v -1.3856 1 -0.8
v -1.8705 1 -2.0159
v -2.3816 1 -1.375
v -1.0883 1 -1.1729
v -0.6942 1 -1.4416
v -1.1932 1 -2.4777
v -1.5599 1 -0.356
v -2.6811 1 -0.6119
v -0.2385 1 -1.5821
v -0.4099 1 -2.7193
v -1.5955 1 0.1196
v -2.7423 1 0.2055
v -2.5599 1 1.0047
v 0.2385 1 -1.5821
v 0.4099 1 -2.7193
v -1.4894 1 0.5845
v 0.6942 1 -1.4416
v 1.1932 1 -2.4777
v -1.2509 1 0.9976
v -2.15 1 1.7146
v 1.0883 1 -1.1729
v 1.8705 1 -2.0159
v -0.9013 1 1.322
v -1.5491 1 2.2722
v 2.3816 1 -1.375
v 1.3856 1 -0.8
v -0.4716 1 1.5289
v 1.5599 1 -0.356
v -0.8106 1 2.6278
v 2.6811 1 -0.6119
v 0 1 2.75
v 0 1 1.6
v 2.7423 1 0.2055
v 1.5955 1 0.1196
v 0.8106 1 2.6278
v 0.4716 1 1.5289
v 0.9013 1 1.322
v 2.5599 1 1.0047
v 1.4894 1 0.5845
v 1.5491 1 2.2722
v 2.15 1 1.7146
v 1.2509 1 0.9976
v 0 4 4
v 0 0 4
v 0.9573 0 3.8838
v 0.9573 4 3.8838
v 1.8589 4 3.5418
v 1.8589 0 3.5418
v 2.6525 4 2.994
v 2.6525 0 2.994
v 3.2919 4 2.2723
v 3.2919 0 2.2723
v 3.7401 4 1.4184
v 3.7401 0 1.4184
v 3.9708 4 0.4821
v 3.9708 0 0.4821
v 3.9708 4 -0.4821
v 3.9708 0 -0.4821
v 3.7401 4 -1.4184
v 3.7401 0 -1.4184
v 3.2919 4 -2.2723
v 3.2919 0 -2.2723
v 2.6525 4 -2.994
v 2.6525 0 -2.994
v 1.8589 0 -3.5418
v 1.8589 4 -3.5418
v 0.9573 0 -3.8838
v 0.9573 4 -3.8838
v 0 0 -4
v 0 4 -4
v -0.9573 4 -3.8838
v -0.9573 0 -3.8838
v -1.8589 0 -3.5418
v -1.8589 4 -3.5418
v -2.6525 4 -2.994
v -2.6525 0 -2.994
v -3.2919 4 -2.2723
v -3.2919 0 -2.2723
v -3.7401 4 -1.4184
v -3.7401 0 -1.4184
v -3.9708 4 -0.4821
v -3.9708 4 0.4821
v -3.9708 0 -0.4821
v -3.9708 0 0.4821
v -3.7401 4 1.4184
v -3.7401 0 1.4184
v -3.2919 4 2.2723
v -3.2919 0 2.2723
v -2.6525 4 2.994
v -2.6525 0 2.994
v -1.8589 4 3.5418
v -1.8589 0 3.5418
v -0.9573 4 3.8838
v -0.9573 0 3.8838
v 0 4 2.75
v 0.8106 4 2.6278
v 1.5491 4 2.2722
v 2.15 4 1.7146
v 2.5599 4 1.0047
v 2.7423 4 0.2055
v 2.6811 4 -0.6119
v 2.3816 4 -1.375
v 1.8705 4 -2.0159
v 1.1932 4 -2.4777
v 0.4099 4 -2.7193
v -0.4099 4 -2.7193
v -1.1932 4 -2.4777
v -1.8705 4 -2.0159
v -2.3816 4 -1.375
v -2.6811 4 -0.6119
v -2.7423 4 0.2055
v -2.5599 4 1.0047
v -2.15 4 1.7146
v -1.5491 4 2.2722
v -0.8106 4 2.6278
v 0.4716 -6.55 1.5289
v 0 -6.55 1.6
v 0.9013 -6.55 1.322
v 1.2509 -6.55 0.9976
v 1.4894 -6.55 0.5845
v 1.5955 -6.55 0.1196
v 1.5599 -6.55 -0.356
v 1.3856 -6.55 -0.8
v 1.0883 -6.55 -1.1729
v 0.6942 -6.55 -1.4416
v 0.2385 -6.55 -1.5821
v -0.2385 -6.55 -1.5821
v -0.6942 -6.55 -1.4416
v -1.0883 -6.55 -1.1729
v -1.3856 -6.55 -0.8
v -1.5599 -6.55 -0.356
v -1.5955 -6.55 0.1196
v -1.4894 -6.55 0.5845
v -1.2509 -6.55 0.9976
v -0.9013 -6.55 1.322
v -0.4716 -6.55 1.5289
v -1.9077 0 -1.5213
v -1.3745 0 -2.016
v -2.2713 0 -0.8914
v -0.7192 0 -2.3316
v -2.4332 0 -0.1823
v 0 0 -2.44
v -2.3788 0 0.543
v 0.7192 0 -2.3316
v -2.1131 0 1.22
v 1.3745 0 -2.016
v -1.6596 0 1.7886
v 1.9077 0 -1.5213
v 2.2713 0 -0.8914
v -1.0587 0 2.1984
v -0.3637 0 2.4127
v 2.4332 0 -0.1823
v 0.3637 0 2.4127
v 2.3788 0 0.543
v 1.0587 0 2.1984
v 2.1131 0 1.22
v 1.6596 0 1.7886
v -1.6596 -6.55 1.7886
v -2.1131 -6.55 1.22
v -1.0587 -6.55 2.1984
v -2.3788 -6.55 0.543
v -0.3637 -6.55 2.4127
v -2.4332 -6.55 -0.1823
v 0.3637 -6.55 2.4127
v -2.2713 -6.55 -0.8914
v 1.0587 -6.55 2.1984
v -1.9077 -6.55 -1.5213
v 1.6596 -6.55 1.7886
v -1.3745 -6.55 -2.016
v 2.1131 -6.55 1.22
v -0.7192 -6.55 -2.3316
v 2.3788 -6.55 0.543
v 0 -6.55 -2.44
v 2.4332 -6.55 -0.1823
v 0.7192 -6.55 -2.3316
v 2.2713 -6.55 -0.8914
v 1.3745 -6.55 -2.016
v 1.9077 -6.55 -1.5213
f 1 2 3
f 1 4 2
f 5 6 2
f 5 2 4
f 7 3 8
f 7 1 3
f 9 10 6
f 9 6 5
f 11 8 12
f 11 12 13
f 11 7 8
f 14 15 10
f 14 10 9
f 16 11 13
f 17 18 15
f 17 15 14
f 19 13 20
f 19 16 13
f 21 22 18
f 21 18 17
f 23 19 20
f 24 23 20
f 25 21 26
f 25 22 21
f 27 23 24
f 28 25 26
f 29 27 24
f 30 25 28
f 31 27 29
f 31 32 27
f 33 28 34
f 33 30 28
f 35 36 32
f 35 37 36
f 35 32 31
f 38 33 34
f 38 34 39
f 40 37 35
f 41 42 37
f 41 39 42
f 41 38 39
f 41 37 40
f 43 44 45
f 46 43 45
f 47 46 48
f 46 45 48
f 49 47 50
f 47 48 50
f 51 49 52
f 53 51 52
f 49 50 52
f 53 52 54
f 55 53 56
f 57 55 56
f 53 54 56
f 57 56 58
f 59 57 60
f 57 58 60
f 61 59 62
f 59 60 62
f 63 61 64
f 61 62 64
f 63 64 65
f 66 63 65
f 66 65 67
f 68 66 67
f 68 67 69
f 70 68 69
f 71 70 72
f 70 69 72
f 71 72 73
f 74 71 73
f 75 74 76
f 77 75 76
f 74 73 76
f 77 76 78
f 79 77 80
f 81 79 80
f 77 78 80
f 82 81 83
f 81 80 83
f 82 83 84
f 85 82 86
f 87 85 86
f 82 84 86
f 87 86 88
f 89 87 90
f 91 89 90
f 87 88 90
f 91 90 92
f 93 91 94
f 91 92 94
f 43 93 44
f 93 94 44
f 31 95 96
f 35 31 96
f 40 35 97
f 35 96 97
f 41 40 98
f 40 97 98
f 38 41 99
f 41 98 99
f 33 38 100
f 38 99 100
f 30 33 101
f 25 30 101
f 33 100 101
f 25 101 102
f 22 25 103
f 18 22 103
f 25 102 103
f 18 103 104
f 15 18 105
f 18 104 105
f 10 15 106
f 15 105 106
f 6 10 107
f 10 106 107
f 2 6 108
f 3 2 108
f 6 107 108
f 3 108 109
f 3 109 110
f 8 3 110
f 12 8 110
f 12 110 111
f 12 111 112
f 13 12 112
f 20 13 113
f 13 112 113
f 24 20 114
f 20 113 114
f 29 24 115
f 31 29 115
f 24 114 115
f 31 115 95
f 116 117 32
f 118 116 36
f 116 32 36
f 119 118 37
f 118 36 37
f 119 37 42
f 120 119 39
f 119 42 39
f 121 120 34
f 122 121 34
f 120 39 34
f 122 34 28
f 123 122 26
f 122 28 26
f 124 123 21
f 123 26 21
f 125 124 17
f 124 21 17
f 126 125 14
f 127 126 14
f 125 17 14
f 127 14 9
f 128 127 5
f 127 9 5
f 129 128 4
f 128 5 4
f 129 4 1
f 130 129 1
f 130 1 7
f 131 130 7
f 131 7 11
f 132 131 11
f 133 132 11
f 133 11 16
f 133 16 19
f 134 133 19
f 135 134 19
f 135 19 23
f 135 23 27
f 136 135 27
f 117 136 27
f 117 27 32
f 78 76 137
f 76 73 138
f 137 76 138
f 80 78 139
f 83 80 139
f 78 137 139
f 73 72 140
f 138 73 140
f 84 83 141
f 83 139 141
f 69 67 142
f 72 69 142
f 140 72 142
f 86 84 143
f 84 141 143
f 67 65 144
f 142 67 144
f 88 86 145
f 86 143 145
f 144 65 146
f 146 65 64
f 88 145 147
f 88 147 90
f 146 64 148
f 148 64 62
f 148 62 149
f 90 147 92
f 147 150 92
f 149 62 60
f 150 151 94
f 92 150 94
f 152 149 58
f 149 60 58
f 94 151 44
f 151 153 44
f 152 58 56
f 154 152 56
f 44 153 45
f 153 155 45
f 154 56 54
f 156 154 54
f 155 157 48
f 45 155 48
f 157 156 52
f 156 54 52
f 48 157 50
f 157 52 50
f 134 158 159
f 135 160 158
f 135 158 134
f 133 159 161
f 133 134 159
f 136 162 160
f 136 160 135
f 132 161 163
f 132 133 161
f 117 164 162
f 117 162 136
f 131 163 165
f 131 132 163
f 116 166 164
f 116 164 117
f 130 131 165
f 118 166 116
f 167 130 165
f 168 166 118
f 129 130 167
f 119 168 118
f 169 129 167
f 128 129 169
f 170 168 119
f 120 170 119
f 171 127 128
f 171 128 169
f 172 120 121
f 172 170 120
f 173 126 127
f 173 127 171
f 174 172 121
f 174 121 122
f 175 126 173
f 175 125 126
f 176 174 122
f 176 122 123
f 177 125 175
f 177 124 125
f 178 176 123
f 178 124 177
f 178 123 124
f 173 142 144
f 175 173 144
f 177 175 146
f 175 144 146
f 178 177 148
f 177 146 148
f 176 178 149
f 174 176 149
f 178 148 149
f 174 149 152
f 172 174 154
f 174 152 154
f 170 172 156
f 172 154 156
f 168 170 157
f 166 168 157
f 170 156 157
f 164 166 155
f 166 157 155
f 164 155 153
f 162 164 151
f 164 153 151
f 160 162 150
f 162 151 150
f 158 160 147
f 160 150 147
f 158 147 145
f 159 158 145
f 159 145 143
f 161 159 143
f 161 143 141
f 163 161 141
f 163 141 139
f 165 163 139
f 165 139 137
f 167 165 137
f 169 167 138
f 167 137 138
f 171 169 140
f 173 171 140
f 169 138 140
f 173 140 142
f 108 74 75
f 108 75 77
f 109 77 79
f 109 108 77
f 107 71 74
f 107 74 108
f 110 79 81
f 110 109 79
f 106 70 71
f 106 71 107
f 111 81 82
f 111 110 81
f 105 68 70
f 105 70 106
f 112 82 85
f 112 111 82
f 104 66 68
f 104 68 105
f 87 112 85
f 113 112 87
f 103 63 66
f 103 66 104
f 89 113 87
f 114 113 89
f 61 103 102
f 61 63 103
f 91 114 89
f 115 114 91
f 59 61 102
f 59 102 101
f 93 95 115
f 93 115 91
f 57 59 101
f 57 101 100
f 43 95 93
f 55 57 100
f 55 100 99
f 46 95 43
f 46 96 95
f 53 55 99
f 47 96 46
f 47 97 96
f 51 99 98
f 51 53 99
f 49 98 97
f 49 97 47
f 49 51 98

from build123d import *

# Parameters (mm, degrees)
SKETCH1_R           = 4
BOSS_EXTRUDE1_DEPTH = 4
SKETCH2_R           = 2.44
BOSS_EXTRUDE2_DEPTH = 6.55
SKETCH3_R           = 2.75
CUT_EXTRUDE1_DEPTH  = 3
SKETCH4_R           = 1.6
CUT_EXTRUDE2_DEPTH  = 10.434113631


with BuildPart() as part:
    # Sketch1 → Boss-Extrude1 (new body)
    with BuildSketch(Plane(origin=(0, 0, 0), x_dir=(1, 0, 0), z_dir=(0, 1, 0))):
        with Locations(Location((0, 0, 0), (0, 0, 270))):
            Circle(SKETCH1_R)
    extrude(amount=BOSS_EXTRUDE1_DEPTH)

    # Sketch2 → Boss-Extrude2 (add)
    with BuildSketch(Plane.XZ):
        with Locations(Location((0, 0, 0), (0, 0, 270))):
            Circle(SKETCH2_R)
    extrude(amount=BOSS_EXTRUDE2_DEPTH)

    # Sketch3 → Cut-Extrude1 (cut)
    with BuildSketch(Plane(origin=(0, 4, 0), x_dir=(1, 0, 0), z_dir=(0, 1, 0))):
        with Locations(Location((0, 0, 0), (0, 0, 270))):
            Circle(SKETCH3_R)
    extrude(amount=-CUT_EXTRUDE1_DEPTH, mode=Mode.SUBTRACT)

    # Sketch4 → Cut-Extrude2 (cut, through all)
    with BuildSketch(Plane(origin=(0, 1, 0), x_dir=(1, 0, 0), z_dir=(0, 1, 0))):
        with Locations(Location((0, 0, 0), (0, 0, 270))):
            Circle(SKETCH4_R)
    extrude(amount=-CUT_EXTRUDE2_DEPTH, mode=Mode.SUBTRACT)


solid = part.part
